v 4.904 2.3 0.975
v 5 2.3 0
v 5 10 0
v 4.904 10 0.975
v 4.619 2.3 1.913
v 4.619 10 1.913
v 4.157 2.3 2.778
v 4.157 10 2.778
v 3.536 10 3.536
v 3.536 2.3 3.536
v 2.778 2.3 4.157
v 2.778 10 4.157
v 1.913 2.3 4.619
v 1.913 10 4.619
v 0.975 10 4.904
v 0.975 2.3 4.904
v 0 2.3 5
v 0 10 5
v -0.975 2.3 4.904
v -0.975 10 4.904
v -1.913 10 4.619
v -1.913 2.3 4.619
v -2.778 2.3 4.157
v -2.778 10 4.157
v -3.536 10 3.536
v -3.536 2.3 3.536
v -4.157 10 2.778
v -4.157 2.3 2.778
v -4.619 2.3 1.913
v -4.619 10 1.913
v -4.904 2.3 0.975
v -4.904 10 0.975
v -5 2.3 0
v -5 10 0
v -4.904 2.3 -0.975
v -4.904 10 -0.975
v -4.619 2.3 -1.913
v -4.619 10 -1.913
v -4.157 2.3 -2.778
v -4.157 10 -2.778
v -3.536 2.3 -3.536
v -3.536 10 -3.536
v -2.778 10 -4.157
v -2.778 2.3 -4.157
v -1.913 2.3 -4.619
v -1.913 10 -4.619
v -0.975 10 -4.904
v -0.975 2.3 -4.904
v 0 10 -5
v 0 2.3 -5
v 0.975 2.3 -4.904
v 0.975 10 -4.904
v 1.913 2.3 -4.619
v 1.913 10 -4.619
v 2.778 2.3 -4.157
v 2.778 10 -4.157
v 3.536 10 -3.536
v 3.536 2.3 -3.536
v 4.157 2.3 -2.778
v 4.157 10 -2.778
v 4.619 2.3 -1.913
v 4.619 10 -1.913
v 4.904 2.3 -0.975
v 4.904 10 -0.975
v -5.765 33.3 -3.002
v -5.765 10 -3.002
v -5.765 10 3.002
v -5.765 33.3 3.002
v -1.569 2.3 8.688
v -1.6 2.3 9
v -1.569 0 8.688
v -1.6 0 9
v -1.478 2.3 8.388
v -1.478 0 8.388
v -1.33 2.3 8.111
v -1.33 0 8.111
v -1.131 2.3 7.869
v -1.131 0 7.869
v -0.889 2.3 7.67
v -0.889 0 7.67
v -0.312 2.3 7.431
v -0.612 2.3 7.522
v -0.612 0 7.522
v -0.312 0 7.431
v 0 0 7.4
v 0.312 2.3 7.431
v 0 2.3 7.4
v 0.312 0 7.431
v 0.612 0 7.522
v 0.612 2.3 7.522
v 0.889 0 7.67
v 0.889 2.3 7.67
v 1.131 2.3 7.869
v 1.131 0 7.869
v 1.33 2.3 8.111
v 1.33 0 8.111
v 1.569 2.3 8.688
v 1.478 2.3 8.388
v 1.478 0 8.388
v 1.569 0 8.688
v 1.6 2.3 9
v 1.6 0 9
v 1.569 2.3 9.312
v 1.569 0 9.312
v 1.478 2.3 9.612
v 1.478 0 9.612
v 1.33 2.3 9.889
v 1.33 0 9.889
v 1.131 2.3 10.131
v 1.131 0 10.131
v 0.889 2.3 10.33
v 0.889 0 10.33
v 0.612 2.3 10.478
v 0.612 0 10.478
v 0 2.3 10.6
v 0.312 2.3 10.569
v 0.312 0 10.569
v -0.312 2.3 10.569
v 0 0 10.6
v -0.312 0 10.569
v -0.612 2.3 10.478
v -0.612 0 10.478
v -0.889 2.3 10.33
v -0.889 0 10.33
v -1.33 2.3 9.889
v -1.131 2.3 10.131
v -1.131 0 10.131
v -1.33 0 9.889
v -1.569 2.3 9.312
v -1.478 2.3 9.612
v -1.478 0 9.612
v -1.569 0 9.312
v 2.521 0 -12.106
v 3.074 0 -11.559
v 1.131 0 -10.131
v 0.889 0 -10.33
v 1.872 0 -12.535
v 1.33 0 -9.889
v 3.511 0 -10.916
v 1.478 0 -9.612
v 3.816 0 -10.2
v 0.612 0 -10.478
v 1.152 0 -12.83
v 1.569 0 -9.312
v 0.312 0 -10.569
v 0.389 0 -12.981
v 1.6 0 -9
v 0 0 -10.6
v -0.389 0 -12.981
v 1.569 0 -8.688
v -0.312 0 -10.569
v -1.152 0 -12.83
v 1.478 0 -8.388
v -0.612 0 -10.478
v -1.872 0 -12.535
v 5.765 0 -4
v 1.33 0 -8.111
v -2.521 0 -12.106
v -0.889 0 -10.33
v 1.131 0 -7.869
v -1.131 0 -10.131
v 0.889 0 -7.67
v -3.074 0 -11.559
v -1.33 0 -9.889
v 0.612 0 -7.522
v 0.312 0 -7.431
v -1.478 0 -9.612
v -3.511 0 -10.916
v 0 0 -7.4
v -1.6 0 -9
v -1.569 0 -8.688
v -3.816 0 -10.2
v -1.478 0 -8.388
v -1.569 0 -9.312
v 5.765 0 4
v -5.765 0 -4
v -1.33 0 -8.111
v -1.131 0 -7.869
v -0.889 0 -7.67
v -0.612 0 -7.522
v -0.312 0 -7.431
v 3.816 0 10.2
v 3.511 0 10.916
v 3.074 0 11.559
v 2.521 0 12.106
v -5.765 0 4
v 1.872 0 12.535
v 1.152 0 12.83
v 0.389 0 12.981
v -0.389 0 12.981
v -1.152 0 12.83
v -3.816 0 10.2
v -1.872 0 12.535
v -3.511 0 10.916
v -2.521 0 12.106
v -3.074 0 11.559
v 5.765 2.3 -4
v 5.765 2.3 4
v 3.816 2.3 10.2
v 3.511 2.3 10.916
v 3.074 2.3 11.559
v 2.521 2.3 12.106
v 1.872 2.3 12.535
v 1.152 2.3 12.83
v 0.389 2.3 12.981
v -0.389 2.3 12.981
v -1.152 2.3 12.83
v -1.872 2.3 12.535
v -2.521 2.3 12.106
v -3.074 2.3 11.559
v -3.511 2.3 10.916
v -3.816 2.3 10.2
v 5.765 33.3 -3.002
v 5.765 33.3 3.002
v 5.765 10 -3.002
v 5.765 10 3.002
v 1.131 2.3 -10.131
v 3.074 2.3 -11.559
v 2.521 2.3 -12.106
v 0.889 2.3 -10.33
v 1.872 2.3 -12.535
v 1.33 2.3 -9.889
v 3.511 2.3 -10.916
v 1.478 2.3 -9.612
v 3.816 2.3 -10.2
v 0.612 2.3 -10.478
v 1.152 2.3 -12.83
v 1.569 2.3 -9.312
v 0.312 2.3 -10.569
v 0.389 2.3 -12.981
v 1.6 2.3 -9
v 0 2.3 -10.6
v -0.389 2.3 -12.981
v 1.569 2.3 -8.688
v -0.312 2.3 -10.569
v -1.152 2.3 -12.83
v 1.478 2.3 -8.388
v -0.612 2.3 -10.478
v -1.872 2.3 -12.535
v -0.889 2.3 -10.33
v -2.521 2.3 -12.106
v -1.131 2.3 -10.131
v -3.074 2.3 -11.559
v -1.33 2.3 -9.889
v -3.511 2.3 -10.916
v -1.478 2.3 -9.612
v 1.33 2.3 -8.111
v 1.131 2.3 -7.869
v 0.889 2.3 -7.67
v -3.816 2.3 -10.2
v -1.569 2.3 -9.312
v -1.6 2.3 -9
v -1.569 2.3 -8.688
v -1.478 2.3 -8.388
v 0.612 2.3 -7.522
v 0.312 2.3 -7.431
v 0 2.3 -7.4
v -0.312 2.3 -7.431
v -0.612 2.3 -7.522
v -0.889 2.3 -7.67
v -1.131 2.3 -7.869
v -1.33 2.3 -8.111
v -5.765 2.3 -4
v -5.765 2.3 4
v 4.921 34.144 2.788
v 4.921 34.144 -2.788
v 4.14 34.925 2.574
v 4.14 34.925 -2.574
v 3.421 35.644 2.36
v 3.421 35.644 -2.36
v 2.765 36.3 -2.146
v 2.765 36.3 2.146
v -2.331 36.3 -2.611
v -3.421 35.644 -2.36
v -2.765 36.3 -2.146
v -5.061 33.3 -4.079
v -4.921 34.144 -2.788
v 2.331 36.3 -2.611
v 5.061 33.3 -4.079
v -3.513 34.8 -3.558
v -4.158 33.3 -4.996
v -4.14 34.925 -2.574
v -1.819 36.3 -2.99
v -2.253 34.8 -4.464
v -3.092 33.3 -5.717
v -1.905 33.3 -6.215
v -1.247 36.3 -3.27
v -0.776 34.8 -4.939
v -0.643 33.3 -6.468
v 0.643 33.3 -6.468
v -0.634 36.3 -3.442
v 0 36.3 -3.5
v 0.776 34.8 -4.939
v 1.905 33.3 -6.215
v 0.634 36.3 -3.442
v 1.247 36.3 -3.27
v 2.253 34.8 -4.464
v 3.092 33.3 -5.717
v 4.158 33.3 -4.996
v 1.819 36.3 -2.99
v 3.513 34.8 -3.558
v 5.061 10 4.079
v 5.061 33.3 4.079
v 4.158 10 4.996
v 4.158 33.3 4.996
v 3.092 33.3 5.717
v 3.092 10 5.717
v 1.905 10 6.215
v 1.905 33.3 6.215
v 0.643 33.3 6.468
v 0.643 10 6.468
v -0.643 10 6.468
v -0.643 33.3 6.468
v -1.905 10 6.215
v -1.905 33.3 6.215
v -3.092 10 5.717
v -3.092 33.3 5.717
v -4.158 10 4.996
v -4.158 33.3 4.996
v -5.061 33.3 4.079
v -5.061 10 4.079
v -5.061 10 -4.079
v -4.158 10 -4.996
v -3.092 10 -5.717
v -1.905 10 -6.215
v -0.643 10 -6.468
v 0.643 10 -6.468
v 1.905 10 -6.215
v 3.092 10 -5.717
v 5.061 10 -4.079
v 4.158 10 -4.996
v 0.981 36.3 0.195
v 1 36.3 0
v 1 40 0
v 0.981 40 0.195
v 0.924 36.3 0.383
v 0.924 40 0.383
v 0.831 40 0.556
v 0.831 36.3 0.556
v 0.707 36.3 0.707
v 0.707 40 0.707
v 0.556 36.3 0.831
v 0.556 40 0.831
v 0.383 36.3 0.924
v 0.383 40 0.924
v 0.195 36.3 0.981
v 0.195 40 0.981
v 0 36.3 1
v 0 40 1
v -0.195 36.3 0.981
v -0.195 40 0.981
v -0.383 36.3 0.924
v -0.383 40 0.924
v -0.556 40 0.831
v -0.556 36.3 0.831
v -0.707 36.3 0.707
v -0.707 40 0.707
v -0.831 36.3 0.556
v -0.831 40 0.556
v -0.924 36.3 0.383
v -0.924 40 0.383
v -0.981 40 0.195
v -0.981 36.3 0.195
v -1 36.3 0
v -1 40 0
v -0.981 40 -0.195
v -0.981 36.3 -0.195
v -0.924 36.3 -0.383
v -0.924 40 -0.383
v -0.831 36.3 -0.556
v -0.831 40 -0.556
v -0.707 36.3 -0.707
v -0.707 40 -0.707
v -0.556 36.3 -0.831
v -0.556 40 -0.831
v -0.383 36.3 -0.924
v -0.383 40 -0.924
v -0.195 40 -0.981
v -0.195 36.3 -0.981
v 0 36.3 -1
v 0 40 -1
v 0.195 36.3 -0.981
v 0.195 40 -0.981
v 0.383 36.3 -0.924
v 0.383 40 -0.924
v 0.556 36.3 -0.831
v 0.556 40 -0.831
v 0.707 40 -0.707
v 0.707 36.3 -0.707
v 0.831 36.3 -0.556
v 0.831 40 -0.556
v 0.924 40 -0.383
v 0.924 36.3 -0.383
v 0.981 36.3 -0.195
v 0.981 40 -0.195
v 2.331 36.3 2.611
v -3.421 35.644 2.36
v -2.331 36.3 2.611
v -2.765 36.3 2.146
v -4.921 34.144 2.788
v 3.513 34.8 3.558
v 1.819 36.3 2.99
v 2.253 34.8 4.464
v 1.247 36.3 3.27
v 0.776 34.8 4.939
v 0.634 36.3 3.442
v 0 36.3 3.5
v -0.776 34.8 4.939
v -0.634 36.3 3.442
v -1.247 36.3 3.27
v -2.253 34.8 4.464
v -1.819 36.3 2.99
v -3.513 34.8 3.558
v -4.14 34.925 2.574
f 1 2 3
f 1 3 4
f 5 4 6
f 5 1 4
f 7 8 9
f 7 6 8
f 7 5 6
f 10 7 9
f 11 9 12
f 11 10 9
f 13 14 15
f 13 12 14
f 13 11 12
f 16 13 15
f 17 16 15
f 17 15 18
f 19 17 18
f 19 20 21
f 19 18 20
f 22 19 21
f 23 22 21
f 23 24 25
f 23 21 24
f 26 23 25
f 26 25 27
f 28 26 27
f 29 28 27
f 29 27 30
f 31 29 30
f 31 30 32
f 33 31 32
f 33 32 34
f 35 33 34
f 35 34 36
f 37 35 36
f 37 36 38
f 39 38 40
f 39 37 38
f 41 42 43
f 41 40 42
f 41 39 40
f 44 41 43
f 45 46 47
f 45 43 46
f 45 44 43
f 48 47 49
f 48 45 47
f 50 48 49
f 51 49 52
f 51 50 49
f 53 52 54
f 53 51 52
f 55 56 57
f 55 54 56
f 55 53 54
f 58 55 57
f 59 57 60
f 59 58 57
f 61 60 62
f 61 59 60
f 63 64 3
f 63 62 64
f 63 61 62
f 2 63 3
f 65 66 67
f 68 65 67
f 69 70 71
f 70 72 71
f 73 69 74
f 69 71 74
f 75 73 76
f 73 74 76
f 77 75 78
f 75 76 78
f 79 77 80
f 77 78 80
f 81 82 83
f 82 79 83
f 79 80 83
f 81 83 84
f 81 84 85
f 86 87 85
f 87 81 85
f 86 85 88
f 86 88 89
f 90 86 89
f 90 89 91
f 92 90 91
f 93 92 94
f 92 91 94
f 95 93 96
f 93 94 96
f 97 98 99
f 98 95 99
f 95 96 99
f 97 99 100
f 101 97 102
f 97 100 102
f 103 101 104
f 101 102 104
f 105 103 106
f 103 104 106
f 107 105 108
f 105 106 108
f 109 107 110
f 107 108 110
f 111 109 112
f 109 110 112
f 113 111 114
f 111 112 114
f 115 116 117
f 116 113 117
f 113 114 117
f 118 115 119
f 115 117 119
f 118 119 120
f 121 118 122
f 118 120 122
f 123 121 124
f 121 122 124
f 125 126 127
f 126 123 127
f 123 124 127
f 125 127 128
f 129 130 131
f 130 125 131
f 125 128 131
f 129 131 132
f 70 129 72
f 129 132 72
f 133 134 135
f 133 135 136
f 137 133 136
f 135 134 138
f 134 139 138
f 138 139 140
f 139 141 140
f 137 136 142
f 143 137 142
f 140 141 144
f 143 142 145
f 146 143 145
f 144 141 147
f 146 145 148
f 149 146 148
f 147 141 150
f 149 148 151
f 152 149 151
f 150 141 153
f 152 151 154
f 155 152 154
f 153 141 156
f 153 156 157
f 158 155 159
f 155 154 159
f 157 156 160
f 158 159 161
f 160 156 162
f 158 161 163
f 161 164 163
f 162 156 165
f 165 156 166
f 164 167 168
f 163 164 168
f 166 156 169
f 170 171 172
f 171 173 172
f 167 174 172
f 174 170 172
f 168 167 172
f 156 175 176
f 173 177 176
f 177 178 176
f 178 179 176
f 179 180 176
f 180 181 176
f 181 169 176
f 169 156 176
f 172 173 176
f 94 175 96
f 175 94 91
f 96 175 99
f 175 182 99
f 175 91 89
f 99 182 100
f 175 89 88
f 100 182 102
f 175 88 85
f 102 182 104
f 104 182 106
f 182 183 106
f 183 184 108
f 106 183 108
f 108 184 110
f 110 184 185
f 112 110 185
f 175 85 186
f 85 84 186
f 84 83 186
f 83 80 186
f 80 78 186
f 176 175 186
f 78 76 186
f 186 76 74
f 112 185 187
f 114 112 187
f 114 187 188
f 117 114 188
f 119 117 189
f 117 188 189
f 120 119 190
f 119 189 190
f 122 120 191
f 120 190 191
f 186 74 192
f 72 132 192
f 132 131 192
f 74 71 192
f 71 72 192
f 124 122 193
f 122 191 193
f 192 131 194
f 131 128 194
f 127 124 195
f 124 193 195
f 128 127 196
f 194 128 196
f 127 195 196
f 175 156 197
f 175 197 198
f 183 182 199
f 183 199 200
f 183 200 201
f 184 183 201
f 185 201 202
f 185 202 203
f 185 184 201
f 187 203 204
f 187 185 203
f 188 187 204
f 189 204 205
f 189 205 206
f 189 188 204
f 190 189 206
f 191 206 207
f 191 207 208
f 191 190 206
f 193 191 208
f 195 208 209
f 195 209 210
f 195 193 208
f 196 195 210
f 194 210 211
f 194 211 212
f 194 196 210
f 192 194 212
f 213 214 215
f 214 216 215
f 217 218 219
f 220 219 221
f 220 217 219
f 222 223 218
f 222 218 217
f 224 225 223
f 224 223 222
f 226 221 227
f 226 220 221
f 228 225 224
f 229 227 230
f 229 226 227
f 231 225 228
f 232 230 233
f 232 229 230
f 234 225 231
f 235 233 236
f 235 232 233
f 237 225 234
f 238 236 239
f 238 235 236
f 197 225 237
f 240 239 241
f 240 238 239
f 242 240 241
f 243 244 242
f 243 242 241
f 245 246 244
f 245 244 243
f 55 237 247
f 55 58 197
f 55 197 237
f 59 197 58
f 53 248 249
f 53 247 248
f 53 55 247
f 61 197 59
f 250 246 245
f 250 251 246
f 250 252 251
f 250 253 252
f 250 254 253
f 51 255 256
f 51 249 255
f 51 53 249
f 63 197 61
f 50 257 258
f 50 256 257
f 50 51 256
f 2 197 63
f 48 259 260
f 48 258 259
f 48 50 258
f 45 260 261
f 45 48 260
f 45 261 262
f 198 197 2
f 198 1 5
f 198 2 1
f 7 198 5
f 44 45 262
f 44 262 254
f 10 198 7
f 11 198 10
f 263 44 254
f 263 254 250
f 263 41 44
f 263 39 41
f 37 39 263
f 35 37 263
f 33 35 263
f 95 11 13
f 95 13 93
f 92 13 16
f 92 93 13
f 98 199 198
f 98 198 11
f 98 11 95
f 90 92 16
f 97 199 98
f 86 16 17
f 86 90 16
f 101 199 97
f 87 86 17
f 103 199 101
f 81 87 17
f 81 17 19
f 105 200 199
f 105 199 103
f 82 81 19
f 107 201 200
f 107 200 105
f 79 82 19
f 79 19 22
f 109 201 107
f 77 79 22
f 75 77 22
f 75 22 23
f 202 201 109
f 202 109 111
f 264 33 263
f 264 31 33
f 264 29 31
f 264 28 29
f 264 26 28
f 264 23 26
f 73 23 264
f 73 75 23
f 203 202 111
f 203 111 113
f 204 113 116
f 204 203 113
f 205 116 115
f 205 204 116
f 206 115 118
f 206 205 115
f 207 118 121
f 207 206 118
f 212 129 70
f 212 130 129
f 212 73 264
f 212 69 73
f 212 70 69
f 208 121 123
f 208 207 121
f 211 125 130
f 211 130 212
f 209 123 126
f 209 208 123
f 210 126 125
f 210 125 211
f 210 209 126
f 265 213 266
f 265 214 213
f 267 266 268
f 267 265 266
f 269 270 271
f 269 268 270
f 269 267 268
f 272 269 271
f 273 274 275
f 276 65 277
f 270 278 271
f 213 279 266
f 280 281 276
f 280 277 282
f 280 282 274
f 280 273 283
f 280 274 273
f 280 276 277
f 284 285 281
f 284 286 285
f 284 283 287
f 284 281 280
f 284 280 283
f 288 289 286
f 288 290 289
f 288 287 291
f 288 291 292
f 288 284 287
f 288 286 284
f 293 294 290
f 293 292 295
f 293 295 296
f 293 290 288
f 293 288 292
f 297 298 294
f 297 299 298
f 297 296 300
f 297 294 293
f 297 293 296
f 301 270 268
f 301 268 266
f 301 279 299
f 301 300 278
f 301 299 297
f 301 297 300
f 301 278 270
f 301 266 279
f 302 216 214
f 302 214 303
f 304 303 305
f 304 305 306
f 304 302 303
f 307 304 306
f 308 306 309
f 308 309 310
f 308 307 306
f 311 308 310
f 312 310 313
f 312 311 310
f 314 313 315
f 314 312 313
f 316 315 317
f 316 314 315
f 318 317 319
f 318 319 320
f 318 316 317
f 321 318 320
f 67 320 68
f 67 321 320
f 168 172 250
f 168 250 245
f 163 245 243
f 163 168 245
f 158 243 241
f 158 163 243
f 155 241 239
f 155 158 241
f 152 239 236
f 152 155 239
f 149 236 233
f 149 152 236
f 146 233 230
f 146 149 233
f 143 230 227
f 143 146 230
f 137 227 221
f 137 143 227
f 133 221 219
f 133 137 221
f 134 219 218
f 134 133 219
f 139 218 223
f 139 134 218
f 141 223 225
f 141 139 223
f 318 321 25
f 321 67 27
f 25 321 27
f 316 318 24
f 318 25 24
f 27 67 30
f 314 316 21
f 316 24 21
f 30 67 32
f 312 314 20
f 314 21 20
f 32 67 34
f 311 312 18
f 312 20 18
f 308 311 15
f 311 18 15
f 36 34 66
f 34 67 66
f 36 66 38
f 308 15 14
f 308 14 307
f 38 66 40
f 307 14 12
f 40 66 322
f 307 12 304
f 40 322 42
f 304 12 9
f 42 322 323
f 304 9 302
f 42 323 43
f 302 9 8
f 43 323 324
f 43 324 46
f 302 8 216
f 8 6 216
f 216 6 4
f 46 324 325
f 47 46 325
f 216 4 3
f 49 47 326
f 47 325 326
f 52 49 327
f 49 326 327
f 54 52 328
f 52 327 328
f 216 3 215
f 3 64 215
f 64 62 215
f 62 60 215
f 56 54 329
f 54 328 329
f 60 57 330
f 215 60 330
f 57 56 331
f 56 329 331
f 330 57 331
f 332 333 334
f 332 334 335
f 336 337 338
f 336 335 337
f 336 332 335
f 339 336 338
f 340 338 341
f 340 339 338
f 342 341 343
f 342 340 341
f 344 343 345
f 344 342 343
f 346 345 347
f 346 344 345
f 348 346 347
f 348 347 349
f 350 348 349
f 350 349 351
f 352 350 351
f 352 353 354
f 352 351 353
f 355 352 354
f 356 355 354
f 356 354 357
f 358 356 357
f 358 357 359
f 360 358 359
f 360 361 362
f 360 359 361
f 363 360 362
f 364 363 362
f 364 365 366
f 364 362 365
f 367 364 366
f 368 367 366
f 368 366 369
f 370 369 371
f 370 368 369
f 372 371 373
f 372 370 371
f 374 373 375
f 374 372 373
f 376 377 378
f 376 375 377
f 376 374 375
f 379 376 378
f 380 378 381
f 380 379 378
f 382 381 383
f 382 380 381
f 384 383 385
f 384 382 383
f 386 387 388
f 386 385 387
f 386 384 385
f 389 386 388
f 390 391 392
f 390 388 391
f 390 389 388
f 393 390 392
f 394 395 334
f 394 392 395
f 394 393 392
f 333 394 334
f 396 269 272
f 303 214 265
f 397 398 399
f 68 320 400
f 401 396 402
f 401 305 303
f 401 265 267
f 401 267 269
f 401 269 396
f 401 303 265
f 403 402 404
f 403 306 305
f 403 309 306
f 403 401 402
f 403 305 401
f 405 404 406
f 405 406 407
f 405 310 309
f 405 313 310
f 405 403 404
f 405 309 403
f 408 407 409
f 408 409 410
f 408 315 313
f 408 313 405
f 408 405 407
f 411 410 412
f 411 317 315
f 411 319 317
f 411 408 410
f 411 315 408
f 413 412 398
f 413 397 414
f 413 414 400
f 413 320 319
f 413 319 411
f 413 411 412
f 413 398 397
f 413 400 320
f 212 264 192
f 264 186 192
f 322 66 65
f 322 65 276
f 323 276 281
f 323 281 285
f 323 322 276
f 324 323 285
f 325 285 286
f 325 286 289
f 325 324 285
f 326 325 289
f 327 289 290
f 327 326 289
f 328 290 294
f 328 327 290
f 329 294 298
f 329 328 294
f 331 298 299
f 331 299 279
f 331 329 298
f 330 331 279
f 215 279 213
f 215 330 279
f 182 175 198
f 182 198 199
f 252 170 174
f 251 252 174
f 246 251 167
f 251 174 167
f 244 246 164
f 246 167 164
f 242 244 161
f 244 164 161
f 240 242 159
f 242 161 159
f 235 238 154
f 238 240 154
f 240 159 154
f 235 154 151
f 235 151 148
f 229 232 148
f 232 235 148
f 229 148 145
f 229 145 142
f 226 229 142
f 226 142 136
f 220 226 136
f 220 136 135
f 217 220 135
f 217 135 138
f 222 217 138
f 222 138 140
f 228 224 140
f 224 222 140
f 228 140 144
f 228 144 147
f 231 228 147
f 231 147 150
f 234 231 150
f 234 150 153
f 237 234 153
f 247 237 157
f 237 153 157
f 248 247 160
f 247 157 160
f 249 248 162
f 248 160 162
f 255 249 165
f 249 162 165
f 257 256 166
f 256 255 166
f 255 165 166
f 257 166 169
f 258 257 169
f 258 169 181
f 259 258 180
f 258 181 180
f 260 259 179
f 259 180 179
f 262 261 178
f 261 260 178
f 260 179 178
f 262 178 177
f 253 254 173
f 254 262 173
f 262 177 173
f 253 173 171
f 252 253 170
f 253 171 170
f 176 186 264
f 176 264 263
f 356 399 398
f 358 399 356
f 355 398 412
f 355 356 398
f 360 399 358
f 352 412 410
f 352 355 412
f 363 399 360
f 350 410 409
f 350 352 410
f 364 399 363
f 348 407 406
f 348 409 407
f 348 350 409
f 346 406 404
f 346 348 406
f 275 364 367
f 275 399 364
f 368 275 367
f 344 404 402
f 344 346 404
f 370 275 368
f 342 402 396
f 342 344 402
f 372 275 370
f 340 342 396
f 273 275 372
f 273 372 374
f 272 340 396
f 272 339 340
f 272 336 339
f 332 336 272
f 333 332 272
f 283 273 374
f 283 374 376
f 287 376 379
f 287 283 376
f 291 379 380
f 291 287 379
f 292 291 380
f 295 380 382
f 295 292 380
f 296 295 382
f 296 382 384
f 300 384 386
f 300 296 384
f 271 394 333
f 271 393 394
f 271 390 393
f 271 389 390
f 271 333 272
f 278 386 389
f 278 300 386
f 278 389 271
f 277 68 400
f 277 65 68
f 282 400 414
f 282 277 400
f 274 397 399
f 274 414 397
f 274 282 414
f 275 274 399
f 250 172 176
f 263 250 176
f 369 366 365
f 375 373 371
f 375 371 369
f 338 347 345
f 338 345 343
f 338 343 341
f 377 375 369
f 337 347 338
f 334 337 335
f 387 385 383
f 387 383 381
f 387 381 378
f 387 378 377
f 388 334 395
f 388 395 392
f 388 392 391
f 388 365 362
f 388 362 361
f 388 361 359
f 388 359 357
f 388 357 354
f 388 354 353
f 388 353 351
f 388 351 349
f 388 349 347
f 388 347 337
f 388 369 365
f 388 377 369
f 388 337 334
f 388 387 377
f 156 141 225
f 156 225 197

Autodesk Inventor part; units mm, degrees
ref_plane "YZ Plane" through (0, 0, 0) normal (1, 0, 0) x (0, 1, 0)
ref_plane "XZ Plane" through (0, 0, 0) normal (0, 1, 0) x (-1, 0, 0)
ref_plane "XY Plane" through (0, 0, 0) normal (0, 0, 1) x (1, 0, 0)
sketch "Sketch1" plane through (0, 0, 0) normal (0, 1, 0) x (-1, 0, 0)
  line L0 (-5.765, 13) -> (5.765, 13)
  line L1 (5.765, 13) -> (5.765, -13)
  line L2 (5.765, -13) -> (-5.765, -13)
  line L3 (-5.765, -13) -> (-5.765, 13)
  line L4 (-5.765, 13) -> (5.765, -13) construction
  line L5 (5.765, 13) -> (-5.765, -13) construction
  circle A0 centre (0, 9) radius 1.6
  circle A1 centre (0, -9) radius 1.6
  circle A2 centre (0, 9) radius 4
  circle A3 centre (0, -9) radius 4
  line L6 (5.765, 4) -> (3.8159, 10.1997)
  line L7 (3.8159, -10.1997) -> (5.765, -4)
  line L8 (-3.8159, -10.1997) -> (-5.765, -4)
  line L9 (-5.765, 4) -> (-3.8159, 10.1997)
  point P0 (0, 0)
  dimension "d0" = 26
  dimension "d1" = 11.53
  dimension "d2" = 18
  dimension "d3" = 9
  dimension "d4" = 3.2
  dimension "d5" = 8
  dimension "d6" = 4
  dimension "d7" = 4
extrude "Extrusion1" add sketch "Sketch1" along normal blind 2.3 contours A2 | L9 A2 L6 L1 L7 A3 L8 L3 | A3
sketch "Sketch2" plane through (0, 2.3, 0) normal (0, 1, 0) x (1, 0, 0)
  line L0 (5.765, -4) -> (5.765, 4) projected
  line L1 (5.765, 4) -> (3.8159, 10.1997) projected
  arc A0 (3.8159, 10.1997) -> (-3.8159, 10.1997) centre (0, 9) ccw projected
  line L2 (-3.8159, 10.1997) -> (-5.765, 4) projected
  line L3 (-5.765, 4) -> (-5.765, -4) projected
  line L4 (-5.765, -4) -> (-3.8159, -10.1997) projected
  arc A1 (-3.8159, -10.1997) -> (3.8159, -10.1997) centre (0, -9) ccw projected
  line L5 (3.8159, -10.1997) -> (5.765, -4) projected
  circle A2 centre (0, -9) radius 1.6 projected
  circle A3 centre (0, 9) radius 1.6 projected
  circle A4 centre (0, 0) radius 5
  dimension "d10" = 10
extrude "Extrusion2" add sketch "Sketch2" along normal blind 7.7 contours A4
sketch "Sketch3" plane through (0, 10, 0) normal (0, 1, 0) x (1, 0, 0)
  circle A0 centre (0, 0) radius 5 projected
  line L0 (5.765, 6.5) -> (-5.765, 6.5)
  line L1 (-5.765, 6.5) -> (-5.765, -6.5)
  line L2 (-5.765, -6.5) -> (5.765, -6.5)
  line L3 (5.765, -6.5) -> (5.765, 6.5)
  line L4 (5.765, 6.5) -> (-5.765, -6.5) construction
  line L5 (-5.765, 6.5) -> (5.765, -6.5) construction
  circle A1 centre (0, 0) radius 6.5
  point P0 (-5.765, 4)
  point P1 (5.765, -3.0025)
  point P2 (5.765, 3.0025)
  point P3 (-5.765, 3.0025)
  point P4 (-5.765, -3.0025)
  dimension "d13" = 13
extrude "Extrusion3" add sketch "Sketch3" along normal blind 26.3 contours A0 | A1 L3 L1
sketch "Sketch4" plane through (0, 36.3, 0) normal (0, 1, 0) x (1, 0, 0)
  circle A0 centre (0, 0) radius 1
  dimension "d19" = 2
chamfer "Chamfer1" distance 3 angle 45 4 edges at (0, 36.3, -6.5) (0, 36.3, 6.5) (5.765, 36.3, 0) (-5.765, 36.3, 0)
extrude "Extrusion4" add sketch "Sketch4" along normal blind 3.7
equation "\"d3\" = 0.5 * d2"
equation "\"d7\" = d6"
properties part number "BLTouch" material "ABS Plastic"
